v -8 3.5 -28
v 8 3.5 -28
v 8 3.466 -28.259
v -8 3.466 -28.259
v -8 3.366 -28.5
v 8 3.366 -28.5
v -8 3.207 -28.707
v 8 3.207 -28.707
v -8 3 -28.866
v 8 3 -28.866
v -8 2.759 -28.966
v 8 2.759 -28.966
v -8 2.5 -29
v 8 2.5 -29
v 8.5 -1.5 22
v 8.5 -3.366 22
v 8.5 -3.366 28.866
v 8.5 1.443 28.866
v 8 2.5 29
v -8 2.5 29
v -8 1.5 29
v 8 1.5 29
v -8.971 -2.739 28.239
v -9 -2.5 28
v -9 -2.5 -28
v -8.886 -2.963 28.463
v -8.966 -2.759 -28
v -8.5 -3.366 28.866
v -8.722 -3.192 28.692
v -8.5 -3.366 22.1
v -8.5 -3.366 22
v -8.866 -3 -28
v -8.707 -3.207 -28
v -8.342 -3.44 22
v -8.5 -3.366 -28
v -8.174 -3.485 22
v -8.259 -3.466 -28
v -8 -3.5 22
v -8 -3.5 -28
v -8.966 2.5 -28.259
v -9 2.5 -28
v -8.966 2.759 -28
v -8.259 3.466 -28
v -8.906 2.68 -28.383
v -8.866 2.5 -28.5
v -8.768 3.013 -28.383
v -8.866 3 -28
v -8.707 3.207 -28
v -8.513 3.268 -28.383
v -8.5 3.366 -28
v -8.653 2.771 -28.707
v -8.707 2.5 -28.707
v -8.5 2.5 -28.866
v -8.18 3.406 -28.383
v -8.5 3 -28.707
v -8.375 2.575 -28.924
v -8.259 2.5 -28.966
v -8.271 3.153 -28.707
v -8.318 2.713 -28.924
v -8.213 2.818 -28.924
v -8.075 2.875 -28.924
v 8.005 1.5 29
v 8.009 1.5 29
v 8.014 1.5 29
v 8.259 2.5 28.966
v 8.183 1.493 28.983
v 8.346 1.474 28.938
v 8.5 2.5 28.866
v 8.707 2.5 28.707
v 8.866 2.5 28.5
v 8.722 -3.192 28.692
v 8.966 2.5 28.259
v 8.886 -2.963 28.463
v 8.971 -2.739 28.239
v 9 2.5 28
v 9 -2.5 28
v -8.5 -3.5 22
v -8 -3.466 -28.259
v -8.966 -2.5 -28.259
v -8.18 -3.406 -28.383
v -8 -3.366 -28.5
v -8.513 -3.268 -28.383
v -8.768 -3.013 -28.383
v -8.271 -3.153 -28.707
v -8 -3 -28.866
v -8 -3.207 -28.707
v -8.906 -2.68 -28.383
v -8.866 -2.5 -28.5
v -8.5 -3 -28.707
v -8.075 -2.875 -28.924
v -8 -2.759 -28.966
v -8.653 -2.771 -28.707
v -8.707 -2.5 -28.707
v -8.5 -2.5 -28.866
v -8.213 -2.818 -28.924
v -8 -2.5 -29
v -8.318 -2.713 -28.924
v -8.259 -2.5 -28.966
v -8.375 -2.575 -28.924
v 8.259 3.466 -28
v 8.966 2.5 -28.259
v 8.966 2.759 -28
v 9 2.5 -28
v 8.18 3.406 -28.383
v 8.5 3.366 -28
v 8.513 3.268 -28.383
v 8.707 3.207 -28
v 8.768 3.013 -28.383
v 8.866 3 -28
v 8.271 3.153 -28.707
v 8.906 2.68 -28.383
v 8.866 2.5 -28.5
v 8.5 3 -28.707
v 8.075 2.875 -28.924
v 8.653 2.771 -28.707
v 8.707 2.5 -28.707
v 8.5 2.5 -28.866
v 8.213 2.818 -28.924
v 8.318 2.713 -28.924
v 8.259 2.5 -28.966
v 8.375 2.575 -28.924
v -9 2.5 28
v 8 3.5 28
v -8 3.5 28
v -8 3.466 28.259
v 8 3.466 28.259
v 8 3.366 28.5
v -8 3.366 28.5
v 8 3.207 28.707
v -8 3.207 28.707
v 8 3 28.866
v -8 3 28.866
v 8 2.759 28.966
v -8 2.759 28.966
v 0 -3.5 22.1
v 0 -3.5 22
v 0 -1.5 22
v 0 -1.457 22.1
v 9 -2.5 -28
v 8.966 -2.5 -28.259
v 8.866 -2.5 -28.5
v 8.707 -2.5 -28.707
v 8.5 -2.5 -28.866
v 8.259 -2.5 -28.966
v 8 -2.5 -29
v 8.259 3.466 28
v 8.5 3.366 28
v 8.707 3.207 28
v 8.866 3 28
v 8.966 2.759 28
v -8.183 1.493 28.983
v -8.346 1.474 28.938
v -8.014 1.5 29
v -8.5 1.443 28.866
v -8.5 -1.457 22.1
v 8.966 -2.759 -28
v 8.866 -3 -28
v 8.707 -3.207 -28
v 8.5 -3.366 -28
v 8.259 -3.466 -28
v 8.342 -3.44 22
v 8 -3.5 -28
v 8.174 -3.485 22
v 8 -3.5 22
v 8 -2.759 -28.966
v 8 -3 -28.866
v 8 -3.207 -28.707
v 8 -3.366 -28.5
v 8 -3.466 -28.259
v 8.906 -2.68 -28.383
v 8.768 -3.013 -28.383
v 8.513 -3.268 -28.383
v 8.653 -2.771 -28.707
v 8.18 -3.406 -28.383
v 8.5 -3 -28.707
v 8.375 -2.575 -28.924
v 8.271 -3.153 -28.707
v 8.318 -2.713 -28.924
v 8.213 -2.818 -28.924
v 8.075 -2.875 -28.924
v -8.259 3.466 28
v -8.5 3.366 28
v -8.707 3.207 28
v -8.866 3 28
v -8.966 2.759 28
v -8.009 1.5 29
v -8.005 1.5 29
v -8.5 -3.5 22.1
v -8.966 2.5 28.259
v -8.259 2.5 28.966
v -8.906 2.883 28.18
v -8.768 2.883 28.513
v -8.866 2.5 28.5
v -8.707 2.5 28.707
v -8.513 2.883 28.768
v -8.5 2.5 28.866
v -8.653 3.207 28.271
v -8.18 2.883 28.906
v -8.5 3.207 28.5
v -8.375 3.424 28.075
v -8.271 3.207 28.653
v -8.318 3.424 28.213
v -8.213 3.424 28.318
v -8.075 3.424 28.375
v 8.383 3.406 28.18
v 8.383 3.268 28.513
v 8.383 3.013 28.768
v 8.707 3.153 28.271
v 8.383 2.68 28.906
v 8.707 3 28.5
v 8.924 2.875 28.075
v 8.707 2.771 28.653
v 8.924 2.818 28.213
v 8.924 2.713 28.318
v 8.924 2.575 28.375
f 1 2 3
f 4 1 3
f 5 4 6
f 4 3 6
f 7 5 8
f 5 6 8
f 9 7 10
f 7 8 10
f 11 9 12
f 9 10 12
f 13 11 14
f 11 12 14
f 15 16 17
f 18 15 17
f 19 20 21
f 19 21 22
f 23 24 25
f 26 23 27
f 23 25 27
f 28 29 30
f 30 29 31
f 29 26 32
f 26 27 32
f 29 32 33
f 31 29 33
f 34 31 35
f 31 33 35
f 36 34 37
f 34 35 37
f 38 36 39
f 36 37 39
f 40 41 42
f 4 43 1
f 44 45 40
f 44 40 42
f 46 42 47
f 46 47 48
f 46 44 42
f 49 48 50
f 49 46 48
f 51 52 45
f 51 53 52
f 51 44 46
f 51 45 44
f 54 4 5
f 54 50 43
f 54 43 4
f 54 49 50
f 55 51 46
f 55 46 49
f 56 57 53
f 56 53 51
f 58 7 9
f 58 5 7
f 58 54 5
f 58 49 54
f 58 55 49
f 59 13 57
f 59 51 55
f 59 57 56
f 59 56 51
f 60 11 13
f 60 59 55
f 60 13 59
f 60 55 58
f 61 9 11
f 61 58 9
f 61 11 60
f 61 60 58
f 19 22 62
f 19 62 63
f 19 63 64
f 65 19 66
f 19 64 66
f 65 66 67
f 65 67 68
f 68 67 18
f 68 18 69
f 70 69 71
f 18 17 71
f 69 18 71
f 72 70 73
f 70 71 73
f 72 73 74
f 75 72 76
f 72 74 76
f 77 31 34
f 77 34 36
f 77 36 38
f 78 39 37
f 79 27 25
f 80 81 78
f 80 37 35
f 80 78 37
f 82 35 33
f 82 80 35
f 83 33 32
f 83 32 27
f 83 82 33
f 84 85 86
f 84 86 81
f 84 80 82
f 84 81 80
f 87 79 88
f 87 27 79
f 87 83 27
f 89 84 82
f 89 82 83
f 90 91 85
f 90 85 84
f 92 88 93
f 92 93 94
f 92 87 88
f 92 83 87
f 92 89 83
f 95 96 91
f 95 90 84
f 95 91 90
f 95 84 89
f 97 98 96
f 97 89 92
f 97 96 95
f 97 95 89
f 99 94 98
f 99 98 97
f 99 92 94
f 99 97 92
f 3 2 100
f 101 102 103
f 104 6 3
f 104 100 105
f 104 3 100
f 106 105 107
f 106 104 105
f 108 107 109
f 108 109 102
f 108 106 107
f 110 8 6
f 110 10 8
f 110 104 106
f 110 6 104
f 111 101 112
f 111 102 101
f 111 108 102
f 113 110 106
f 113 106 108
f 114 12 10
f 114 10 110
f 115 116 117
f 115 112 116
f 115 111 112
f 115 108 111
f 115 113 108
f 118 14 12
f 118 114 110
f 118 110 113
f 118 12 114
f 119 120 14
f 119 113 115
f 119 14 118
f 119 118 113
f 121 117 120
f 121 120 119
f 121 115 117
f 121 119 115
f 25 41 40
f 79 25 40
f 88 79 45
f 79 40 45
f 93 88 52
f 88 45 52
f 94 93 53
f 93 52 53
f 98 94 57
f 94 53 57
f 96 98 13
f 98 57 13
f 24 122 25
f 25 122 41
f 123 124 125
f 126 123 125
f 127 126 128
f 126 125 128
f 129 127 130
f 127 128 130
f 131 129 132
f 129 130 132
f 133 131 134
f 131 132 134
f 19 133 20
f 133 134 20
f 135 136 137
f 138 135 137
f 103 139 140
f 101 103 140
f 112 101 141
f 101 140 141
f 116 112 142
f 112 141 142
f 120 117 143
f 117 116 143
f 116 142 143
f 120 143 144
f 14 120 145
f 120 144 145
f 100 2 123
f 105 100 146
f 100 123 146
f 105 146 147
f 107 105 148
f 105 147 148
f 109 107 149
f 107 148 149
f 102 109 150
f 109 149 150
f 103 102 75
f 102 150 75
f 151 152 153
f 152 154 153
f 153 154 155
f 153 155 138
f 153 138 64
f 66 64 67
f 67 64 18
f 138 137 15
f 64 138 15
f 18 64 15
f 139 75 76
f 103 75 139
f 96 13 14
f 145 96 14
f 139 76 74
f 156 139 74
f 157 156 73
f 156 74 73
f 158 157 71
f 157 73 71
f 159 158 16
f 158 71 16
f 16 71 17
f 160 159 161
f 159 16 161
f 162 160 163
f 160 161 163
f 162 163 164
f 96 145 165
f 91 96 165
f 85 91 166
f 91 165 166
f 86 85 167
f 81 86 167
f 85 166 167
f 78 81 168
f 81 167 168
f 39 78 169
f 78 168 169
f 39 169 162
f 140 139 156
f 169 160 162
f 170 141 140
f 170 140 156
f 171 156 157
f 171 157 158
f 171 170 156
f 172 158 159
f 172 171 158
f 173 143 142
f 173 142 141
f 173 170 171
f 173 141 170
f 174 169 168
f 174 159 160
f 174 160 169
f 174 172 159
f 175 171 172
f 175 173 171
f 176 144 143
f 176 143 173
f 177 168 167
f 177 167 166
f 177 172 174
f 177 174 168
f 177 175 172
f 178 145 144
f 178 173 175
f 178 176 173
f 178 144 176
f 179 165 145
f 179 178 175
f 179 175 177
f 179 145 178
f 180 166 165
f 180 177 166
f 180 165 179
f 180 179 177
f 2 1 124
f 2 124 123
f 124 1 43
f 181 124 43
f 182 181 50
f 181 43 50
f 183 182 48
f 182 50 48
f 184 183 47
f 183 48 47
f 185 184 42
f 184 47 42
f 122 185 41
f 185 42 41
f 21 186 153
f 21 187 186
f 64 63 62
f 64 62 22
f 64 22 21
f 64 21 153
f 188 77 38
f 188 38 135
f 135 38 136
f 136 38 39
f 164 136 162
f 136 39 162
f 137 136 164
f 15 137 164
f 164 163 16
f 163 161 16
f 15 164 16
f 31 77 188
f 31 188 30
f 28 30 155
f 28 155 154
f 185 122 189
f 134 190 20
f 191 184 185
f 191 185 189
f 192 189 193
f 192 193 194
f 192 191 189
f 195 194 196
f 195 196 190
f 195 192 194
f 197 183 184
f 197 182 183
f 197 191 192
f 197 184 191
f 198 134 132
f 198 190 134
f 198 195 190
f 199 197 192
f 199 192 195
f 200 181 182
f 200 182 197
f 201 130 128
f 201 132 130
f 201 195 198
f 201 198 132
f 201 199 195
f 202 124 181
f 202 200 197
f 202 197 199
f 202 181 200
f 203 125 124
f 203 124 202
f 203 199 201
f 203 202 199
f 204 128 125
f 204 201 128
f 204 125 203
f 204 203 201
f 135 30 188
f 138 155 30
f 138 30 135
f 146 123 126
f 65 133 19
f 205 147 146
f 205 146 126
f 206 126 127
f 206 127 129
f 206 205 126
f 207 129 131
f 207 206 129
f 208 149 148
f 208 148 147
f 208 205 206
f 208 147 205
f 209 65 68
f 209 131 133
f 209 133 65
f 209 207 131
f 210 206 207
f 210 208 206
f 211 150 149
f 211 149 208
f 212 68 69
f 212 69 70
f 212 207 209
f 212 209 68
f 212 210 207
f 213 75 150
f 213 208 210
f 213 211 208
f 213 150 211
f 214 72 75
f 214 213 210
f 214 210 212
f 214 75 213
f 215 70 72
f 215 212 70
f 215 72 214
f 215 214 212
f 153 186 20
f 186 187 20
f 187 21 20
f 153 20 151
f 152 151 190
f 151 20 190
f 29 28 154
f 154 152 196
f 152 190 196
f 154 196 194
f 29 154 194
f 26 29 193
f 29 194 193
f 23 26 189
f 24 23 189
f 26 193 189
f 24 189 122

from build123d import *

# Parameters (mm, degrees)
SKETCH1_W           = 18
SKETCH1_H           = 58
BOSS_EXTRUDE1_DEPTH = 3.5
SKETCH2_W           = 17
SKETCH2_H           = 7
CUT_EXTRUDE1_DEPTH  = 5
CHAMFER1_SIZE2      = 3
CHAMFER1_SIZE       = 7
FILLET2_R           = 1
SKETCH3_W           = 8.5
SKETCH3_H           = 3.471291158
BOSS_EXTRUDE2_DEPTH = 0.1


# Some blends are built 0.0001 mm under size
with BuildPart() as part:
    # Sketch1 → Boss-Extrude1 (new, symmetric)
    with BuildSketch(Plane(origin=(0, 0, 0), x_dir=(1, 0, 0), z_dir=(0, 1, 0))):
        Rectangle(SKETCH1_W, SKETCH1_H)
    extrude(amount=BOSS_EXTRUDE1_DEPTH, both=True)

    # Sketch2 → Cut-Extrude1 (cut)
    with BuildSketch(Plane.XZ.offset(3.5)):
        with Locations((0, 25.5)):
            Rectangle(SKETCH2_W, SKETCH2_H)
    extrude(amount=-CUT_EXTRUDE1_DEPTH, mode=Mode.SUBTRACT)

    # Chamfer1
    chamfer1_edges = [part.edges().sort_by_distance(p)[0] for p in [
        (0, 1.5, 22),
    ]]
    chamfer1_side = [part.faces().sort_by_distance(p)[0] for p in [
        (0, 1.5, 22.06),
    ]]
    chamfer(chamfer1_edges, length=CHAMFER1_SIZE - 0.0001, length2=CHAMFER1_SIZE2 - 0.0001, reference=chamfer1_side[0])  # a hair under: the kernel refuses the full size

    # Fillet2
    # the kernel refuses this fillet: 1 mm, written as the material it takes off along each edge
    with BuildSketch(Plane(origin=(8, -2.5, -28), x_dir=(1, 0, 0), z_dir=(0, 0, -1))) as fillet2_piece_1_section:
        Polygon((0, 0), (FILLET2_R, 0), (FILLET2_R, FILLET2_R), (0, FILLET2_R), align=None)
    fillet2_piece_1 = extrude(amount=FILLET2_R, mode=Mode.PRIVATE)
    fillet2_piece_1 = fillet2_piece_1 - Plane(origin=(8, -2.5, -28), x_dir=(-0.7071067811865475, 0.7071067811865475, 0), z_dir=(0, 0, -1)) * Sphere(FILLET2_R, mode=Mode.PRIVATE)
    add(fillet2_piece_1, mode=Mode.SUBTRACT)
    with BuildSketch(Plane(origin=(-8, -2.5, -28), x_dir=(0, -1, 0), z_dir=(0, 0, -1))) as fillet2_piece_2_section:
        Polygon((0, 0), (FILLET2_R, 0), (FILLET2_R, FILLET2_R), (0, FILLET2_R), align=None)
    fillet2_piece_2 = extrude(amount=FILLET2_R, mode=Mode.PRIVATE)
    fillet2_piece_2 = fillet2_piece_2 - Plane(origin=(-8, -2.5, -28), x_dir=(0.7071067811865475, 0.7071067811865475, 0), z_dir=(0, 0, -1)) * Sphere(FILLET2_R, mode=Mode.PRIVATE)
    add(fillet2_piece_2, mode=Mode.SUBTRACT)
    with BuildSketch(Plane(origin=(-8, 2.5, -28), x_dir=(0, 1, 0), z_dir=(0, 0, -1))) as fillet2_piece_3_section:
        Polygon((0, 0), (FILLET2_R, 0), (FILLET2_R, -FILLET2_R), (0, -FILLET2_R), align=None)
    fillet2_piece_3 = extrude(amount=FILLET2_R, mode=Mode.PRIVATE)
    fillet2_piece_3 = fillet2_piece_3 - Plane(origin=(-8, 2.5, -28), x_dir=(0.7071067811865475, -0.7071067811865475, 0), z_dir=(0, 0, -1)) * Sphere(FILLET2_R, mode=Mode.PRIVATE)
    add(fillet2_piece_3, mode=Mode.SUBTRACT)
    with BuildSketch(Plane(origin=(8, 2.5, -28), x_dir=(1, 0, 0), z_dir=(0, 0, -1))) as fillet2_piece_4_section:
        Polygon((0, 0), (FILLET2_R, 0), (FILLET2_R, -FILLET2_R), (0, -FILLET2_R), align=None)
    fillet2_piece_4 = extrude(amount=FILLET2_R, mode=Mode.PRIVATE)
    fillet2_piece_4 = fillet2_piece_4 - Plane(origin=(8, 2.5, -28), x_dir=(-0.7071067811865475, -0.7071067811865475, 0), z_dir=(0, 0, -1)) * Sphere(FILLET2_R, mode=Mode.PRIVATE)
    add(fillet2_piece_4, mode=Mode.SUBTRACT)
    with BuildSketch(Plane(origin=(-8, 2.5, 28), x_dir=(0, 0, 1), z_dir=(0, 1, 0))) as fillet2_piece_5_section:
        Polygon((0, 0), (FILLET2_R, 0), (FILLET2_R, -FILLET2_R), (0, -FILLET2_R), align=None)
    fillet2_piece_5 = extrude(amount=FILLET2_R, mode=Mode.PRIVATE)
    fillet2_piece_5 = fillet2_piece_5 - Plane(origin=(-8, 2.5, 28), x_dir=(0.7071067811865475, 0, -0.7071067811865475), z_dir=(0, 1, 0)) * Sphere(FILLET2_R, mode=Mode.PRIVATE)
    add(fillet2_piece_5, mode=Mode.SUBTRACT)
    with BuildSketch(Plane(origin=(8, 2.5, 28), x_dir=(0, 1, 0), z_dir=(1, 0, 0))) as fillet2_piece_6_section:
        Polygon((0, 0), (FILLET2_R, 0), (FILLET2_R, FILLET2_R), (0, FILLET2_R), align=None)
    fillet2_piece_6 = extrude(amount=FILLET2_R, mode=Mode.PRIVATE)
    fillet2_piece_6 = fillet2_piece_6 - Plane(origin=(8, 2.5, 28), x_dir=(0, -0.7071067811865475, -0.7071067811865475), z_dir=(1, 0, 0)) * Sphere(FILLET2_R, mode=Mode.PRIVATE)
    add(fillet2_piece_6, mode=Mode.SUBTRACT)
    with BuildSketch(Plane(origin=(8, -3.5, -29), x_dir=(0, 0, 1), z_dir=(-1, 0, 0)), Plane(origin=(8, 3.5, -29), x_dir=(0, -1, 0), z_dir=(-1, 0, 0)), Plane(origin=(-8, 3.5, 29), x_dir=(0, -1, 0), z_dir=(1, 0, 0))) as fillet2_piece_7:
        with BuildLine():
            CenterArc((FILLET2_R, FILLET2_R), FILLET2_R, 180, 90)
            Line((0, FILLET2_R), (0, 0))
            Line((0, 0), (FILLET2_R, 0))
        make_face()
    extrude(amount=16, mode=Mode.SUBTRACT)
    with BuildSketch(Plane(origin=(-9, 2.5, -29), x_dir=(0, 0, 1), z_dir=(0, -1, 0))) as fillet2_piece_8:
        with BuildLine():
            CenterArc((FILLET2_R, -FILLET2_R), FILLET2_R, 90, 90)
            Line((0, -FILLET2_R), (0, 0))
            Line((0, 0), (FILLET2_R, 0))
        make_face()
    extrude(amount=5, mode=Mode.SUBTRACT)
    with BuildSketch(Plane(origin=(-9, -3.5, -28), x_dir=(1, 0, 0), z_dir=(0, 0, 1)), Plane(origin=(9, -3.5, 31.5), x_dir=(-1, 0, 0), z_dir=(0, 0, -1))) as fillet2_piece_9:
        with BuildLine():
            CenterArc((FILLET2_R, FILLET2_R), FILLET2_R, 180, 90)
            Line((0, FILLET2_R), (0, 0))
            Line((0, 0), (FILLET2_R, 0))
        make_face()
    extrude(amount=59.5, mode=Mode.SUBTRACT)
    with BuildSketch(Plane(origin=(-9, 3.5, -28), x_dir=(0, -1, 0), z_dir=(0, 0, 1)), Plane(origin=(9, 3.5, 28), x_dir=(0, -1, 0), z_dir=(0, 0, -1))) as fillet2_piece_10:
        with BuildLine():
            CenterArc((FILLET2_R, FILLET2_R), FILLET2_R, 180, 90)
            Line((0, FILLET2_R), (0, 0))
            Line((0, 0), (FILLET2_R, 0))
        make_face()
    extrude(amount=56, mode=Mode.SUBTRACT)
    with BuildSketch(Plane(origin=(9, -2.5, -29), x_dir=(-1, 0, 0), z_dir=(0, 1, 0))) as fillet2_piece_11:
        with BuildLine():
            CenterArc((FILLET2_R, FILLET2_R), FILLET2_R, 180, 90)
            Line((0, FILLET2_R), (0, 0))
            Line((0, 0), (FILLET2_R, 0))
        make_face()
    extrude(amount=5, mode=Mode.SUBTRACT)
    with BuildSketch(Plane(origin=(-9, 2.5, 29), x_dir=(1, 0, 0), z_dir=(0, -1, 0)), Plane(origin=(9, -6, 29), x_dir=(-1, 0, 0), z_dir=(0, 1, 0))) as fillet2_piece_12:
        with BuildLine():
            CenterArc((FILLET2_R, -FILLET2_R), FILLET2_R, 90, 90)
            Line((0, -FILLET2_R), (0, 0))
            Line((0, 0), (FILLET2_R, 0))
        make_face()
    extrude(amount=8.5, mode=Mode.SUBTRACT)

    # Sketch3 → Boss-Extrude2 (add)
    with BuildSketch(Plane.XY.offset(22)):
        with Locations((-4.25, -1.764354421)):
            Rectangle(SKETCH3_W, SKETCH3_H)
    extrude(amount=BOSS_EXTRUDE2_DEPTH)


solid = part.part
